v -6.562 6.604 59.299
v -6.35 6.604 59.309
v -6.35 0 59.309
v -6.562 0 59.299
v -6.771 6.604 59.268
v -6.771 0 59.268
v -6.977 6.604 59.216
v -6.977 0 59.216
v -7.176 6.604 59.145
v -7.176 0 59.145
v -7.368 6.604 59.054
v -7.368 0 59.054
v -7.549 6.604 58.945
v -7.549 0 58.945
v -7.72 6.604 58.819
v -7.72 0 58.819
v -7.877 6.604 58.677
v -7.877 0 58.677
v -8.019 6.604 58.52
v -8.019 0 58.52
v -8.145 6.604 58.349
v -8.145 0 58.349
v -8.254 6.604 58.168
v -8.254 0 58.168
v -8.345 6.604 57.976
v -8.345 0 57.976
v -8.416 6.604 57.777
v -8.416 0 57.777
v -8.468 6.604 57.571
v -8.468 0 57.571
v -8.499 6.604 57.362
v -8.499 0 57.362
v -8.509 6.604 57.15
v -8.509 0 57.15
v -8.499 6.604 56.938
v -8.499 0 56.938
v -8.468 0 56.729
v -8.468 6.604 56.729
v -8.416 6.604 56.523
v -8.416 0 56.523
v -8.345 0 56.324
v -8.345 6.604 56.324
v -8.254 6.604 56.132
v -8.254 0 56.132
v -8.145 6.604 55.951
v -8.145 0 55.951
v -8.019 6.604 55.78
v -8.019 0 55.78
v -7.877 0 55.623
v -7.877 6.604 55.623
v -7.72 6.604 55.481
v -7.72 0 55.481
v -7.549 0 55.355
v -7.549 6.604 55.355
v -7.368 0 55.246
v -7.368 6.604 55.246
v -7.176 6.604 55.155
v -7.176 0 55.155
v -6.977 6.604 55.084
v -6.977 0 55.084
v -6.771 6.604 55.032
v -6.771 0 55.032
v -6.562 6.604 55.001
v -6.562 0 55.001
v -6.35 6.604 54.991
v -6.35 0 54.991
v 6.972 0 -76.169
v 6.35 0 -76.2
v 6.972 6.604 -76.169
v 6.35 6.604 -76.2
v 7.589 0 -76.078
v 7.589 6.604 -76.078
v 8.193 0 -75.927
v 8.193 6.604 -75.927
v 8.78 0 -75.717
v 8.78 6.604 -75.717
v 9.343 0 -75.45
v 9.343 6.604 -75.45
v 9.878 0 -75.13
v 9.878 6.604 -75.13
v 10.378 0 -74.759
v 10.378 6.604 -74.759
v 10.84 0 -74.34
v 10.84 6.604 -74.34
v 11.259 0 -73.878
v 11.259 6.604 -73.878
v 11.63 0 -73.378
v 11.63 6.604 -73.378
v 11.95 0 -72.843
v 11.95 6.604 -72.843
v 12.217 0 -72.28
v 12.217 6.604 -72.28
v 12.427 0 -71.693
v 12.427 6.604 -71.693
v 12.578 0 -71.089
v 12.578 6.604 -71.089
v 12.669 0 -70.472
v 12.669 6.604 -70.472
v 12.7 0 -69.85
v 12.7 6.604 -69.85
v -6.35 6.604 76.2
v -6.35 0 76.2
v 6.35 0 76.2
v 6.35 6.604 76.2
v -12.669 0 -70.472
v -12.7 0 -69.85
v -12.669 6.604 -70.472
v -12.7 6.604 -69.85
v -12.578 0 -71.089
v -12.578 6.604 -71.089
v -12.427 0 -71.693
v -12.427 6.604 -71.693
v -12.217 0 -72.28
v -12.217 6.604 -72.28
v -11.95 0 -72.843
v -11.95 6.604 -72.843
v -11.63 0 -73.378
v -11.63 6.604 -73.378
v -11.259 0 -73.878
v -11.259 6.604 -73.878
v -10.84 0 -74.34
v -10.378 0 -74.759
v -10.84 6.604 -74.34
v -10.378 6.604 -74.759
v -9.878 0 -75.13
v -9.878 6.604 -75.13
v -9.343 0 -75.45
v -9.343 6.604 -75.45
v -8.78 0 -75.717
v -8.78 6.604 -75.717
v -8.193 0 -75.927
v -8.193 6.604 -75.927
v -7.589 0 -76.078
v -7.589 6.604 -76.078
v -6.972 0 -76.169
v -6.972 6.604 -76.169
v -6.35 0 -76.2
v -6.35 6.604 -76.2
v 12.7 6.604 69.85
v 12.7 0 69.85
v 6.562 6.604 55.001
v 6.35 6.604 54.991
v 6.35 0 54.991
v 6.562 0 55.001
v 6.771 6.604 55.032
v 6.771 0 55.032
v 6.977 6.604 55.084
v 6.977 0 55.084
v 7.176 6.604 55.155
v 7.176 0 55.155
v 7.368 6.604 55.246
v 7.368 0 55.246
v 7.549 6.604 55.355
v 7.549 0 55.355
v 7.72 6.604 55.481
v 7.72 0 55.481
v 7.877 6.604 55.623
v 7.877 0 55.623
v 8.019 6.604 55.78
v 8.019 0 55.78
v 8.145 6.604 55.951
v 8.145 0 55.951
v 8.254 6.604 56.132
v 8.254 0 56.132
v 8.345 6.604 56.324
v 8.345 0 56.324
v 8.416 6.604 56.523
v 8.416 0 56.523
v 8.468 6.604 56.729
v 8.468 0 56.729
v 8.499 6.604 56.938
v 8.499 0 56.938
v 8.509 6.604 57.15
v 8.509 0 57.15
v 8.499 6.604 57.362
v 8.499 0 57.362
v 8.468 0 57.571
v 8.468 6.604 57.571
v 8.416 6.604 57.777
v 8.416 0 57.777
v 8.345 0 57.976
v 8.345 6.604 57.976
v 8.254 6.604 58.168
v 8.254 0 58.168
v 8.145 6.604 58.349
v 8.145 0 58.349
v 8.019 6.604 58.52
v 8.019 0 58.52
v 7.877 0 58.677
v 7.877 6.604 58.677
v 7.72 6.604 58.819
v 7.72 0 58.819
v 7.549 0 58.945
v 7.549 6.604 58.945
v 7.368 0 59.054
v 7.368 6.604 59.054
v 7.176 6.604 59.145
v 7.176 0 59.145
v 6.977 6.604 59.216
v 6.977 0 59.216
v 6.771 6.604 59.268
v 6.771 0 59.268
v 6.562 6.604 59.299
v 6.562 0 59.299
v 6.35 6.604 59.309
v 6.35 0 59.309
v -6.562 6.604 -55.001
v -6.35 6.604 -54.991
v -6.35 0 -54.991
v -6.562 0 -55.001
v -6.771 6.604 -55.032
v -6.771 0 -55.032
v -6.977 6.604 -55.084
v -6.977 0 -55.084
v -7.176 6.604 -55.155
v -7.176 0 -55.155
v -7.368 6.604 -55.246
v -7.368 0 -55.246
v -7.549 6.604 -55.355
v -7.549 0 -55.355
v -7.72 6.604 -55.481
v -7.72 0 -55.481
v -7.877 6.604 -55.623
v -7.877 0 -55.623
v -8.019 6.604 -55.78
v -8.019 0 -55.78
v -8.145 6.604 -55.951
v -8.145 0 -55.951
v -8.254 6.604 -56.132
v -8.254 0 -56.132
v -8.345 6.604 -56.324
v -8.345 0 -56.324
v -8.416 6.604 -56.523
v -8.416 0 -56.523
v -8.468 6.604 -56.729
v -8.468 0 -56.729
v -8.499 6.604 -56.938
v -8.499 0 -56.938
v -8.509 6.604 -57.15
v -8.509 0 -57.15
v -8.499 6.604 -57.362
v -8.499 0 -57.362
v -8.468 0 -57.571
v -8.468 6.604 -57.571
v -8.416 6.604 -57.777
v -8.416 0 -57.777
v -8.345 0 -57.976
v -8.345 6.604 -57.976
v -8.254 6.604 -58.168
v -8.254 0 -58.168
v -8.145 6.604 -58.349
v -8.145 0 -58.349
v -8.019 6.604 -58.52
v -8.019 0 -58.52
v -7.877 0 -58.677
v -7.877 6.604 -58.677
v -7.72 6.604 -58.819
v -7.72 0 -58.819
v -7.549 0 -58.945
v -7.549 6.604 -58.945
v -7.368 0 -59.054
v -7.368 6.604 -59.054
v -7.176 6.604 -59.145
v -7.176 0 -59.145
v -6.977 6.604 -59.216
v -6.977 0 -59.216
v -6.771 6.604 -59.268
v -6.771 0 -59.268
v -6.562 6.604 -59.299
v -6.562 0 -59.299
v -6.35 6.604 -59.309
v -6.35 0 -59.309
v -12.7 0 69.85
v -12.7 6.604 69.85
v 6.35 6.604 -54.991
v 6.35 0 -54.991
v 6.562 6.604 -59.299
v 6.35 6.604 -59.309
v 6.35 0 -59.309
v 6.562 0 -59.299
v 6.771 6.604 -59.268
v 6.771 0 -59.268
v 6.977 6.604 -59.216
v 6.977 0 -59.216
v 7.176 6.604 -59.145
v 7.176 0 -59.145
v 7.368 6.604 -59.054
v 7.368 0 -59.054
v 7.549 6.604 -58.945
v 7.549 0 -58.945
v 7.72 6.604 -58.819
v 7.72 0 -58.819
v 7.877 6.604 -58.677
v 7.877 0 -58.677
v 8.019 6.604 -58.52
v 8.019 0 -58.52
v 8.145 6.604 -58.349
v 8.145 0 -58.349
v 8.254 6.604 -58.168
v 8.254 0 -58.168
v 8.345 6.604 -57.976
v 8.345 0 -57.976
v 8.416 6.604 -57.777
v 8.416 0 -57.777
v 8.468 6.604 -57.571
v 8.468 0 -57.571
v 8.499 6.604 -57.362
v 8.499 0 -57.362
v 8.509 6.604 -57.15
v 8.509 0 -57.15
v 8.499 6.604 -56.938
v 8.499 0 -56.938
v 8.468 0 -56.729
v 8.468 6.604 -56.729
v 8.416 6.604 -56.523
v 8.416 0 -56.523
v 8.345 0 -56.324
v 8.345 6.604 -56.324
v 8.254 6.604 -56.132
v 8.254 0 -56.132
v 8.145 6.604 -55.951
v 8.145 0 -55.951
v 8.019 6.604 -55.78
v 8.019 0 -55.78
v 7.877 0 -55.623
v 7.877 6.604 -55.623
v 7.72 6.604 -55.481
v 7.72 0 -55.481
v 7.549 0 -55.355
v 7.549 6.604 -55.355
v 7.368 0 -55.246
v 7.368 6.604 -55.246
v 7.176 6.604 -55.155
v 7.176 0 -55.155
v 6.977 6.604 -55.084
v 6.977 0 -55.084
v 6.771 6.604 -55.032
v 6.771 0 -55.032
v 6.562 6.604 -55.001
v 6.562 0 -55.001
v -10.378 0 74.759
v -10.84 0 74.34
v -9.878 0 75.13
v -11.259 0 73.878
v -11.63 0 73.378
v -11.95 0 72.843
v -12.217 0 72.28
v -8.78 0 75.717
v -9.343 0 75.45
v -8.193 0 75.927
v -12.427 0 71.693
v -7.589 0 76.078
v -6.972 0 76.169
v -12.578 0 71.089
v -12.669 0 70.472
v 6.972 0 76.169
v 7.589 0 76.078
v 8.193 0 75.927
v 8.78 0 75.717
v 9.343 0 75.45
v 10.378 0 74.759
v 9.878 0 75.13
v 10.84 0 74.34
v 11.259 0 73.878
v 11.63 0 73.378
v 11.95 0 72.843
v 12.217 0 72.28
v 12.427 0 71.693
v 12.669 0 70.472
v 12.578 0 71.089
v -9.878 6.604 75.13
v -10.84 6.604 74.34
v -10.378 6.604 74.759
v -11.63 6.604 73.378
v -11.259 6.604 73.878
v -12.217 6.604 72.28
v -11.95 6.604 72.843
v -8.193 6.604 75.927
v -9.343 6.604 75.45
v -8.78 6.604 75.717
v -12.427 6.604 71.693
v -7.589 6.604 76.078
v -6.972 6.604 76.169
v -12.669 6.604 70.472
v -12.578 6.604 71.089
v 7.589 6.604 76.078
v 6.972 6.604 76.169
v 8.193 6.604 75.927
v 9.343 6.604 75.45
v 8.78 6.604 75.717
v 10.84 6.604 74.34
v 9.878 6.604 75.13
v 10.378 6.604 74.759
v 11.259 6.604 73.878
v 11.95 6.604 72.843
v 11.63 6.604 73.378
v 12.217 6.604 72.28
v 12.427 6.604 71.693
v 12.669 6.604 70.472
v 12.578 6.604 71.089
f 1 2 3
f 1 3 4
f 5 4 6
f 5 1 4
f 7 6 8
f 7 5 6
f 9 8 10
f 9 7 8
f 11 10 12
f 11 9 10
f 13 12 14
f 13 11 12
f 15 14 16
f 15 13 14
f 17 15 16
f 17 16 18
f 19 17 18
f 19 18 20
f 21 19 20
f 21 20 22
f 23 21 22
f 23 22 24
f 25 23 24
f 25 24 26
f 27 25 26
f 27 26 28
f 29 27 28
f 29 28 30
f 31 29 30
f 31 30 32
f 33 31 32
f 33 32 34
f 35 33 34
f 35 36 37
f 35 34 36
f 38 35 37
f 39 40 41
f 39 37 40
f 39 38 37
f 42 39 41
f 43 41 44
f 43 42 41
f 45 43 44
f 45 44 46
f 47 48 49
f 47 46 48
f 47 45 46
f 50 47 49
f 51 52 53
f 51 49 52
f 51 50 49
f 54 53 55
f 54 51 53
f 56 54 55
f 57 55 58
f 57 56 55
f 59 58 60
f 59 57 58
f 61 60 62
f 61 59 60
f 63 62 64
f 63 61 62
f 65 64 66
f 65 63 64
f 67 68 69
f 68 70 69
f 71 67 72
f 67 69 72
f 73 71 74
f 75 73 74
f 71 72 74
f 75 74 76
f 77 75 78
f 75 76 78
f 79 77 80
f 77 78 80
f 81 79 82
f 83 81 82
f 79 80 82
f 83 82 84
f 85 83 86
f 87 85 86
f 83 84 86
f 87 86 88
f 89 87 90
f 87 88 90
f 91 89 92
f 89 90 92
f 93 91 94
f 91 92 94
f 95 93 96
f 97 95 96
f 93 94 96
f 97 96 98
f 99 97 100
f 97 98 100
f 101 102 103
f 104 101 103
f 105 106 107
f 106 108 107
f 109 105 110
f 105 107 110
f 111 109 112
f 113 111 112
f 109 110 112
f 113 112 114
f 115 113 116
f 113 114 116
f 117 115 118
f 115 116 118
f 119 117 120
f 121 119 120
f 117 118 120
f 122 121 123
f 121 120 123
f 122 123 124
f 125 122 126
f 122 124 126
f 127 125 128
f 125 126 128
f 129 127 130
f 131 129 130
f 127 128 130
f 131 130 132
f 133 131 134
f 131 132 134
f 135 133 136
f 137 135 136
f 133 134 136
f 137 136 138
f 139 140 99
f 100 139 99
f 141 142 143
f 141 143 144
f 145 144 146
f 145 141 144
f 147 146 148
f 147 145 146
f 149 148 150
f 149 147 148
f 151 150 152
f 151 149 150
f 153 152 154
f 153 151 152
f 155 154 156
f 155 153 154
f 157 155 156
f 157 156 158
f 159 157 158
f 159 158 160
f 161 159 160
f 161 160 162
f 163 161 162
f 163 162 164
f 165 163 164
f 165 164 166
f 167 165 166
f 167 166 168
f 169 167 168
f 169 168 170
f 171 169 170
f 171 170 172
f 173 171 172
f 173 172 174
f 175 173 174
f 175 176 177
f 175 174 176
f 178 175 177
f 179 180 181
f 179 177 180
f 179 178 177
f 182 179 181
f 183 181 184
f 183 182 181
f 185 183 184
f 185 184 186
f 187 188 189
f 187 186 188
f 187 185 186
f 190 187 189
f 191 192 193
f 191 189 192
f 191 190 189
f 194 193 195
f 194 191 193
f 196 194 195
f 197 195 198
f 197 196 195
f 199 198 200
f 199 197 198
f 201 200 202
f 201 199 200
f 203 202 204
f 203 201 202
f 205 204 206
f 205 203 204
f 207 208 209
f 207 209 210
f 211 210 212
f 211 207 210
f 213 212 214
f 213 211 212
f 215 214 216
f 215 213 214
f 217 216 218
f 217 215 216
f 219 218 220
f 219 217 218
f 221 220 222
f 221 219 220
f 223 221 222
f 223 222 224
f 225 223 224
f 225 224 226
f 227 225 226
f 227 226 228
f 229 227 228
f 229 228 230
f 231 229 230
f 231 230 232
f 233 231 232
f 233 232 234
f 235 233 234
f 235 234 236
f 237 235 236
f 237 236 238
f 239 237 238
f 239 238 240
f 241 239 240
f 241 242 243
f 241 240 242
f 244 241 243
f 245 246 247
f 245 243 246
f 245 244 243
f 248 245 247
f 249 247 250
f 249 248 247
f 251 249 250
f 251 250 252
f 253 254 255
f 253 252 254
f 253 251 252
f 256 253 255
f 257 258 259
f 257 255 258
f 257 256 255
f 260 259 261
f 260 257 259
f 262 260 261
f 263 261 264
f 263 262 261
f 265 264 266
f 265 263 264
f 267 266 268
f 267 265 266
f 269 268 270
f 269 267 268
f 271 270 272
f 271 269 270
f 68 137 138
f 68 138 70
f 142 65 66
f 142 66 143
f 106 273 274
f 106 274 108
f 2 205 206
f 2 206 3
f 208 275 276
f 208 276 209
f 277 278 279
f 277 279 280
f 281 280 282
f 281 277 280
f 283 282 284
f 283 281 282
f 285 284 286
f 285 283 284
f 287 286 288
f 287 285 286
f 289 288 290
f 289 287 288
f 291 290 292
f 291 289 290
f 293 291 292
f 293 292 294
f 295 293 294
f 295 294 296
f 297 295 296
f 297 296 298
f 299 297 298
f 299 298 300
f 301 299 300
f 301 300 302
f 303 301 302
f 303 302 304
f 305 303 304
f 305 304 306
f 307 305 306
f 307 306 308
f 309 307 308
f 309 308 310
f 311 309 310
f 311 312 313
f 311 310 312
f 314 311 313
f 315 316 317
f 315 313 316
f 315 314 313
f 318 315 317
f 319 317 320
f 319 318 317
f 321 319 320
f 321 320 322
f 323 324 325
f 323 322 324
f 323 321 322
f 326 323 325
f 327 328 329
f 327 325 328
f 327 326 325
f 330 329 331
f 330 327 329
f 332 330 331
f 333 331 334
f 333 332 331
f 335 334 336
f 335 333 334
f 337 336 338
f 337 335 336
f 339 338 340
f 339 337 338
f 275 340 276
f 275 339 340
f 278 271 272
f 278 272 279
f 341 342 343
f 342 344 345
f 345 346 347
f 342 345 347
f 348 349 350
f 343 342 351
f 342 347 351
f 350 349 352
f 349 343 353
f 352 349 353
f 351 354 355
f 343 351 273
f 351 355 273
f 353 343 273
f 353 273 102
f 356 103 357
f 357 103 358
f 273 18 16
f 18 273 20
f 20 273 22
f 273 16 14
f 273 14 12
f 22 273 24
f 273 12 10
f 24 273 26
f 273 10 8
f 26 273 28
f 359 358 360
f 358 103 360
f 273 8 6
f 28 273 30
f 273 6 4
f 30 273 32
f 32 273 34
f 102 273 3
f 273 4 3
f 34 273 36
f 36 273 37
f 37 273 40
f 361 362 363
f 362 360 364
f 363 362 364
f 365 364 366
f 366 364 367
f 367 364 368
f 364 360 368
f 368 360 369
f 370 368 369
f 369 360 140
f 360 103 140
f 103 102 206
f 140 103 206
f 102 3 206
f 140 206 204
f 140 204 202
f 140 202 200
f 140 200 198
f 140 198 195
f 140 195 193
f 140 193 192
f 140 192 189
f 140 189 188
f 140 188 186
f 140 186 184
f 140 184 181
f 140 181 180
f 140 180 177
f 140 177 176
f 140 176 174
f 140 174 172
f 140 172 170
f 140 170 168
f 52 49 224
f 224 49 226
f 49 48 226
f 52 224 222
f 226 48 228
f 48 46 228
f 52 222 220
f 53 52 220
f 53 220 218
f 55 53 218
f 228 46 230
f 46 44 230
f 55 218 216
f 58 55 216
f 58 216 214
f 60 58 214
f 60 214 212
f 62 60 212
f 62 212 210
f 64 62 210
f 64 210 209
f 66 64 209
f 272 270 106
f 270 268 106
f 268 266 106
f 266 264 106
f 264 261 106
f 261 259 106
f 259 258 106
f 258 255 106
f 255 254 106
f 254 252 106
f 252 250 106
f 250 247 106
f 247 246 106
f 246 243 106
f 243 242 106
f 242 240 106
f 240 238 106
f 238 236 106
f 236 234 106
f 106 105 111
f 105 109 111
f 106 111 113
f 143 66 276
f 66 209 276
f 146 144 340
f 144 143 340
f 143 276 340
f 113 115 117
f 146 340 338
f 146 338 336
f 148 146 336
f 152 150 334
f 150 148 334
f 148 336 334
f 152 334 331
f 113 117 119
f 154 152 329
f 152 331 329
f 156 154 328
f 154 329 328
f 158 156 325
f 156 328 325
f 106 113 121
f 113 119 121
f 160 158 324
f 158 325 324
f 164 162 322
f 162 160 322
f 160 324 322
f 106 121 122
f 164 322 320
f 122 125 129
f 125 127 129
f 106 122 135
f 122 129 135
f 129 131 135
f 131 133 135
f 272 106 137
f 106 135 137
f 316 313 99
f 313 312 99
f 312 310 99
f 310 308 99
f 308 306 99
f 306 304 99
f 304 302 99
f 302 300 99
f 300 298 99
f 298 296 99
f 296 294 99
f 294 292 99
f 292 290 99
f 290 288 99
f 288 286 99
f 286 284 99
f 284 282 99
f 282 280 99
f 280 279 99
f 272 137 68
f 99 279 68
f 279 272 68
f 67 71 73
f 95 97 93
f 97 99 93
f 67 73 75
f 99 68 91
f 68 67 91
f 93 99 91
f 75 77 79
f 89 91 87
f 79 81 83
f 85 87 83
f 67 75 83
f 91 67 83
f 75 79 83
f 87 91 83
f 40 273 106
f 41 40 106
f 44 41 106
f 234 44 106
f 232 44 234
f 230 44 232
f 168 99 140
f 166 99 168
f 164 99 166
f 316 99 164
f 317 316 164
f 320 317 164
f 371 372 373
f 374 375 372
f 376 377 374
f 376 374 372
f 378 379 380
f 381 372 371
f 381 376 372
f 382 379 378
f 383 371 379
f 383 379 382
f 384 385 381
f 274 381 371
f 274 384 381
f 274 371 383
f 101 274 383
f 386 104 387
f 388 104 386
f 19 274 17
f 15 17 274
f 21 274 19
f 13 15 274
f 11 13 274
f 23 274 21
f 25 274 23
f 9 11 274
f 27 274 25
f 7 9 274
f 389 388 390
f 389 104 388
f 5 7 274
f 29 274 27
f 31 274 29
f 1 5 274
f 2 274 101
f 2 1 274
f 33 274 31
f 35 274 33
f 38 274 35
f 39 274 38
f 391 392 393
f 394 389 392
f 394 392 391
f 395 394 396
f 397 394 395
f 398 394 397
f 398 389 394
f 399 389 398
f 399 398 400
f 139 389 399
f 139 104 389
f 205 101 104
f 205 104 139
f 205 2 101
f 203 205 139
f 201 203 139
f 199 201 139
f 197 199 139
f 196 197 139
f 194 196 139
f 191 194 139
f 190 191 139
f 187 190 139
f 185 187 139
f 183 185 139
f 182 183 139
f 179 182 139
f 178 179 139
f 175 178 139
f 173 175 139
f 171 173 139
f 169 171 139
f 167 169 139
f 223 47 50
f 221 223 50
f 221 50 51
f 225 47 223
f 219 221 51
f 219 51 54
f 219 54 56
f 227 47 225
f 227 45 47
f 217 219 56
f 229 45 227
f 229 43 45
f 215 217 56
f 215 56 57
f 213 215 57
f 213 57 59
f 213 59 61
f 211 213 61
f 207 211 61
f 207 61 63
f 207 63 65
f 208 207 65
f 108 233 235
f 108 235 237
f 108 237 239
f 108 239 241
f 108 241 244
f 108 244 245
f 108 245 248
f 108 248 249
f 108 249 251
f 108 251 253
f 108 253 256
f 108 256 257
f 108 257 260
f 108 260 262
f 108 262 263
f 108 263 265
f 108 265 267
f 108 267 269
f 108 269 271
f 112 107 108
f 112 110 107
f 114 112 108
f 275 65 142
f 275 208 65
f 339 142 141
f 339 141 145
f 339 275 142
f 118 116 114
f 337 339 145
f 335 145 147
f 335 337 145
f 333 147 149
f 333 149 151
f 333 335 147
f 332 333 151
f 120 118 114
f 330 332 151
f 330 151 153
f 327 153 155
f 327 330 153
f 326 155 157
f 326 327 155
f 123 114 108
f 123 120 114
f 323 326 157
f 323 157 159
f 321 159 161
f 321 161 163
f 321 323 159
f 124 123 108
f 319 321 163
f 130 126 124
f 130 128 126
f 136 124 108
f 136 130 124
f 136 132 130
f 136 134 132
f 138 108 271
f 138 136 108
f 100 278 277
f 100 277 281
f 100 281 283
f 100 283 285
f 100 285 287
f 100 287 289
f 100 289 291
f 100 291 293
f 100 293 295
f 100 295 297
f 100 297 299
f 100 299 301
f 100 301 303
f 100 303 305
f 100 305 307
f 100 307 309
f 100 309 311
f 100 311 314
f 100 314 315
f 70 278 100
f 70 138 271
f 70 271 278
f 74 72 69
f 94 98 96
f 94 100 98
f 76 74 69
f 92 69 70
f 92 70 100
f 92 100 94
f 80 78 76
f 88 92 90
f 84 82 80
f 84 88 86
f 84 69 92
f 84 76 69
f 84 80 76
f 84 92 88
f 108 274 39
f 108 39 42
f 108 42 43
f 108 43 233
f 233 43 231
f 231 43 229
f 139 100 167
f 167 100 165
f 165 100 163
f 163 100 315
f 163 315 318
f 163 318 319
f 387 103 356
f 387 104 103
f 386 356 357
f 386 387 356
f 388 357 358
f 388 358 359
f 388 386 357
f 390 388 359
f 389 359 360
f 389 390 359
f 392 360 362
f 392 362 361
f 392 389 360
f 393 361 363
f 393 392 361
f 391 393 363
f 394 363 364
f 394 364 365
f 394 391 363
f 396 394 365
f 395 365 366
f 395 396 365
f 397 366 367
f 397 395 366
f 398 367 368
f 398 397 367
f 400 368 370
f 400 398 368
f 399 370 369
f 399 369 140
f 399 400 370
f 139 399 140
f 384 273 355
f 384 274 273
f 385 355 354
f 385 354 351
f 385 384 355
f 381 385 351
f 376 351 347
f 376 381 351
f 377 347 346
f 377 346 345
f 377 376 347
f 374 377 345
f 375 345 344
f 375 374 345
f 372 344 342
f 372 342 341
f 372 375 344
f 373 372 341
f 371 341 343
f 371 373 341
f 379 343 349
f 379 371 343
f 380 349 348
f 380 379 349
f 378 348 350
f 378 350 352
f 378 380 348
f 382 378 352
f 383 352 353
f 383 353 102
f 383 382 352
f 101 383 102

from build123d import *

# Parameters (mm, degrees)
SKETCH1_W           = 25.4
SKETCH1_H           = 152.4
BOSS_EXTRUDE1_DEPTH = 6.604
CUT_EXTRUDE1_DEPTH  = 7.604
FILLET1_R           = 6.35


with BuildPart() as part:
    # Sketch1 → Boss-Extrude1 (new body)
    with BuildSketch(Plane(origin=(0, 0, 0), x_dir=(1, 0, 0), z_dir=(0, 1, 0))):
        Rectangle(SKETCH1_W, SKETCH1_H)
    extrude(amount=BOSS_EXTRUDE1_DEPTH)

    # Sketch2 → Cut-Extrude1 (cut, through all)
    with BuildSketch(Plane(origin=(0, 6.604, 0), x_dir=(1, 0, 0), z_dir=(0, 1, 0))):
        with BuildLine():
            Line((-6.35, 59.309), (6.35, 59.309))
            ThreePointArc((6.35, 59.309), (8.509, 57.15), (6.35, 54.991))
            Line((6.35, 54.991), (-6.35, 54.991))
            ThreePointArc((-6.35, 54.991), (-8.509, 57.15), (-6.35, 59.309))
        make_face()
        with BuildLine():
            Line((-6.35, -54.991), (6.35, -54.991))
            ThreePointArc((6.35, -54.991), (8.509, -57.15), (6.35, -59.309))
            Line((6.35, -59.309), (-6.35, -59.309))
            ThreePointArc((-6.35, -59.309), (-8.509, -57.15), (-6.35, -54.991))
        make_face()
    extrude(amount=-CUT_EXTRUDE1_DEPTH, mode=Mode.SUBTRACT)

    # Fillet1
    fillet1_edges = [part.edges().sort_by_distance(p)[0] for p in [
        (-12.7, 3.302, -76.2),
        (12.7, 3.302, -76.2),
        (12.7, 3.302, 76.2),
        (-12.7, 3.302, 76.2),
    ]]
    fillet(fillet1_edges, radius=FILLET1_R)


solid = part.part
